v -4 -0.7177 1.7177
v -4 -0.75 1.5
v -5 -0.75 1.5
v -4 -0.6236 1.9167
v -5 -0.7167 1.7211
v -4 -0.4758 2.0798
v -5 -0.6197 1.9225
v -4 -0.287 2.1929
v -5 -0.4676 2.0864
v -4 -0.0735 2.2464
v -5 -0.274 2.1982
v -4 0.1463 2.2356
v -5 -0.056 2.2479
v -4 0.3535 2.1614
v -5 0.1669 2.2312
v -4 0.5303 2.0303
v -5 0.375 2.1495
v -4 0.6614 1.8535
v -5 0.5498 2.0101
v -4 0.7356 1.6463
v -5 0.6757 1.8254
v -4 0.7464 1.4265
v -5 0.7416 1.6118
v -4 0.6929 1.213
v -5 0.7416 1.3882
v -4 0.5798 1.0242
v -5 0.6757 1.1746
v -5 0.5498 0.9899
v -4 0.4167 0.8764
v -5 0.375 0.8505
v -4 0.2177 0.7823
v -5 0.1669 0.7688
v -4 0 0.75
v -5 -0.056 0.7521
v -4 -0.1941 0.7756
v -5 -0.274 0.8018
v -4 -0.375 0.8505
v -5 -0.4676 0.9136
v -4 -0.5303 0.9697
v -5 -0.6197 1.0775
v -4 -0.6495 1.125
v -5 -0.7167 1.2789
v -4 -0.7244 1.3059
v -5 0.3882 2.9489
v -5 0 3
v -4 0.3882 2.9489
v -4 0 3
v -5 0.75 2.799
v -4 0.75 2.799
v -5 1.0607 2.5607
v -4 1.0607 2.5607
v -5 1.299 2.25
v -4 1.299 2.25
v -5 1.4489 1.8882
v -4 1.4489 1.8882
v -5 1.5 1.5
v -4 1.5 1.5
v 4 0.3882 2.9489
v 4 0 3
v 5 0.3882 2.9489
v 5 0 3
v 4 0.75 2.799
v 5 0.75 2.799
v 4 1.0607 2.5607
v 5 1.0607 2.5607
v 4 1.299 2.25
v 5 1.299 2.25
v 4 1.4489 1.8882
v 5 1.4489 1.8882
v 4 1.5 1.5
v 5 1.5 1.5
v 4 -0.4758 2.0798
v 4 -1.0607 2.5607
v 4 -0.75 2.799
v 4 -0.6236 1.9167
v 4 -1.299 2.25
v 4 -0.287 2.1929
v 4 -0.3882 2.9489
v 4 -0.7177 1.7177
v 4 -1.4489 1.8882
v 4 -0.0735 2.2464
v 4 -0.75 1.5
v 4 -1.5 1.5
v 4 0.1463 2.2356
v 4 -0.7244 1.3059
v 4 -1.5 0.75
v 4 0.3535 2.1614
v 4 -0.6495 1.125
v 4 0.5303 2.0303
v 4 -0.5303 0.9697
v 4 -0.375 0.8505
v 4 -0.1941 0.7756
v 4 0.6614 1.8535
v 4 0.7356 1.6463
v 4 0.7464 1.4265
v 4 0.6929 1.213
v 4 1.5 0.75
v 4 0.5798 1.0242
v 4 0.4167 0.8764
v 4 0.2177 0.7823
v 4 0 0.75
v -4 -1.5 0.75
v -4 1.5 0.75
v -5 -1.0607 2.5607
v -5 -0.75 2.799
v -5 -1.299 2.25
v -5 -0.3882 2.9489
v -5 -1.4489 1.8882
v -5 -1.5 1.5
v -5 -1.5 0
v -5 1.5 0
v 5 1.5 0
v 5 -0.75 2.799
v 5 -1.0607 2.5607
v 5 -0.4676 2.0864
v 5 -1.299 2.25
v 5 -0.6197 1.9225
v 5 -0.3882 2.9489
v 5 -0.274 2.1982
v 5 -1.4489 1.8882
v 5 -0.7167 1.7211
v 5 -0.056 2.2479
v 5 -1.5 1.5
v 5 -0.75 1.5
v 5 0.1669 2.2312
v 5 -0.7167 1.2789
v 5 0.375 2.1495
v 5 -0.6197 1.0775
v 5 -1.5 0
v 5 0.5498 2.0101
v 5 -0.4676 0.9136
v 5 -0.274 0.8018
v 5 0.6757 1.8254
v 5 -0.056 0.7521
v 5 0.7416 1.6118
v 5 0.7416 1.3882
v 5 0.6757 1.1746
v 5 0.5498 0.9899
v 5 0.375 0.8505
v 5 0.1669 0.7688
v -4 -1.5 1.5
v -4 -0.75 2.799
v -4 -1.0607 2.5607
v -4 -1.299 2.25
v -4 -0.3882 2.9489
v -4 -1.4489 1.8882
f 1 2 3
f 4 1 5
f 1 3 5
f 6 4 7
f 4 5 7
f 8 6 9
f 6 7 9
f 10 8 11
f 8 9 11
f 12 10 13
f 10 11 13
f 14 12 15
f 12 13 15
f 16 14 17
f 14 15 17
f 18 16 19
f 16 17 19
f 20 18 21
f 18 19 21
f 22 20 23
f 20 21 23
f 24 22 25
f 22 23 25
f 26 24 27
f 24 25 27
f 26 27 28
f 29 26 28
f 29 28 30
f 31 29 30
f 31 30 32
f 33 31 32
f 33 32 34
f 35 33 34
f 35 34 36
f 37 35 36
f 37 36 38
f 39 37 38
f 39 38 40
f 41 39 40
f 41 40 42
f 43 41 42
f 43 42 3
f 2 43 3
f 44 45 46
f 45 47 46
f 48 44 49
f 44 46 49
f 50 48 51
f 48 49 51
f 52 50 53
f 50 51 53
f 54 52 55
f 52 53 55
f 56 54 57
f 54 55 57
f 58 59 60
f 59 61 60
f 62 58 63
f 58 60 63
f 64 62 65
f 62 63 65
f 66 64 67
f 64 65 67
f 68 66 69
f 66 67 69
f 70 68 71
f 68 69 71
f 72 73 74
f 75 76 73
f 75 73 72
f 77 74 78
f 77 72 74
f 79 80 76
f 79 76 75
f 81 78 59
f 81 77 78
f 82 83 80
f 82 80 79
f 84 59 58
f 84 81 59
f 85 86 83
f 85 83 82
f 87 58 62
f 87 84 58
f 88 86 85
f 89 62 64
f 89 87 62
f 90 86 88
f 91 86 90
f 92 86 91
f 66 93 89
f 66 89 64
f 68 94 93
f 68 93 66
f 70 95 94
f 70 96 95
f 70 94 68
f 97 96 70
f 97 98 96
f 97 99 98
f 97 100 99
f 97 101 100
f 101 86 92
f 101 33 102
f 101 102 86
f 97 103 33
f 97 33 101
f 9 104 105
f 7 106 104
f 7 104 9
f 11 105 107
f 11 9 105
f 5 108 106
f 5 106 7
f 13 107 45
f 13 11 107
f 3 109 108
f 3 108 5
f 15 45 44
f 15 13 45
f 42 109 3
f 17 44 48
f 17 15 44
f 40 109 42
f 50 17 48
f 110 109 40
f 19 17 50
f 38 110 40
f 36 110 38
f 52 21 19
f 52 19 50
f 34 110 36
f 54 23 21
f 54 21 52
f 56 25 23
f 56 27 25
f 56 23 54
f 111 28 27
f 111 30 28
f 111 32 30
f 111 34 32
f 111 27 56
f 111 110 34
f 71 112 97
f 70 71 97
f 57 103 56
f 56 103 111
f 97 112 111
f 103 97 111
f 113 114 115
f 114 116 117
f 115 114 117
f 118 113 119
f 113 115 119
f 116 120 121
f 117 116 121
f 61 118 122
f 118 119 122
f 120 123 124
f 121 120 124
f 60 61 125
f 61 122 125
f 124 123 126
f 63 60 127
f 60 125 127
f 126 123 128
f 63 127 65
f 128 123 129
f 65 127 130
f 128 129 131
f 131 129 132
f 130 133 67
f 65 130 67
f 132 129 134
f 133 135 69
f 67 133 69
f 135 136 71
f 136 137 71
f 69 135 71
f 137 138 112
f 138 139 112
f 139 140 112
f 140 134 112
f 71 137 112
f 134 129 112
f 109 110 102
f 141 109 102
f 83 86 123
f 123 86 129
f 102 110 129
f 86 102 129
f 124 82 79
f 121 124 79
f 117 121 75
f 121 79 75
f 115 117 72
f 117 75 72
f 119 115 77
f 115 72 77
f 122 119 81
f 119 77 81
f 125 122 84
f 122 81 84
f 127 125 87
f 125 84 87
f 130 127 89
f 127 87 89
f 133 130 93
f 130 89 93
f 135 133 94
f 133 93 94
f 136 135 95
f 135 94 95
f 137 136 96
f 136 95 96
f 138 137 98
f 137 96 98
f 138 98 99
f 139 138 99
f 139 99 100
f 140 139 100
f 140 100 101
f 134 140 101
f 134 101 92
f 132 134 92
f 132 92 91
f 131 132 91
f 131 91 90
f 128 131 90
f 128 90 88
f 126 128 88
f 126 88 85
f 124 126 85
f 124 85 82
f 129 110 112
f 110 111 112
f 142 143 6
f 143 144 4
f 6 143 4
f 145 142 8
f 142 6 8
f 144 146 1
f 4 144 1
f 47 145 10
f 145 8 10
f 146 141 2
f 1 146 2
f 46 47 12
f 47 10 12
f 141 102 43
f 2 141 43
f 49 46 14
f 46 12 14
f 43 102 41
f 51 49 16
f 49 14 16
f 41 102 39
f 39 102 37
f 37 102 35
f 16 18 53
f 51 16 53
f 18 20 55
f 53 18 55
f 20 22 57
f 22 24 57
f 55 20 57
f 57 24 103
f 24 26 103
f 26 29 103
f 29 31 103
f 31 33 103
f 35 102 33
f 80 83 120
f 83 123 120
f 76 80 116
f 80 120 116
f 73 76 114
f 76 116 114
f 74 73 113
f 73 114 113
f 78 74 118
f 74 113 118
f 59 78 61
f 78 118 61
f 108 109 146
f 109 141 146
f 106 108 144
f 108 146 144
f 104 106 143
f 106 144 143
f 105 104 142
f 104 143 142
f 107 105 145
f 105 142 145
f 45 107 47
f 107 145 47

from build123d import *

# Parameters (mm, degrees)
F1_W     = 1
F1_H     = 3
F1_W_2   = 8
F2_DEPTH = 0.75
F3_DEPTH = 3
F4_R     = 0.75
F5_DEPTH = 10
F6_R     = 1.49999


# Not quite as in the source:
# - a fillet or chamfer is up to 0.001 mm smaller than in the source, because OpenCascade refuses the exact size


with BuildPart() as f2:
    # F1 (on Top) → F2 (new body)
    with BuildSketch(Plane.XY):
        with Locations((4.5, 0)):
            Rectangle(F1_W, F1_H)
        with Locations((-4.5, 0)):
            Rectangle(F1_W, F1_H)
        Rectangle(F1_W_2, F1_H)
    extrude(amount=F2_DEPTH)

    # F1 (on Top) → F3 (join)
    with BuildSketch(Plane.XY):
        with Locations((-4.5, 0)):
            Rectangle(F1_W, F1_H)
        with Locations((4.5, 0)):
            Rectangle(F1_W, F1_H)
    extrude(amount=F3_DEPTH)

    # F4 (on face) → F5 (cut, through all)
    with BuildSketch(Plane(origin=(-5, 0, 0), x_dir=(0, -1, 0), z_dir=(-1, 0, 0))):
        with Locations((0, 1.5)):
            Circle(F4_R)
    extrude(amount=-F5_DEPTH, mode=Mode.SUBTRACT)

    # F6 (radius 1.5 in the source; OpenCascade refuses exactly that, so slightly less here)
    f6_edges = [f2.edges().sort_by_distance(p)[0] for p in [
        (4.5, 1.5, 3),
        (4.5, -1.5, 3),
        (-4.5, -1.5, 3),
        (-4.5, 1.5, 3),
    ]]
    fillet(f6_edges, radius=F6_R)


solid = f2.part
